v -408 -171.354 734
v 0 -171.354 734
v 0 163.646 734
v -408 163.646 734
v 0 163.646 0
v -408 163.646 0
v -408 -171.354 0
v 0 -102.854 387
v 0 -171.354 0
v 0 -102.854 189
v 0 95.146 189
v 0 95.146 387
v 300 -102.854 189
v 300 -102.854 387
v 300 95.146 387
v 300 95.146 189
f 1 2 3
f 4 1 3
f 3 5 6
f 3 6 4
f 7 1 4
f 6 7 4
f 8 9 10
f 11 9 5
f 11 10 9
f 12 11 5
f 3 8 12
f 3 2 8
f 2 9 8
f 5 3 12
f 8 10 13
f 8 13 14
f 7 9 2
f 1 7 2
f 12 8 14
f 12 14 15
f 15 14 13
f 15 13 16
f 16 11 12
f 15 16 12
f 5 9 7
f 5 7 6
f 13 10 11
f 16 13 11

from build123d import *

# Parameters (mm, degrees)
F0_W     = 335
F0_H     = 734
F1_DEPTH = 408
F2_W     = 198
F2_H     = 198
F3_DEPTH = 300


with BuildPart() as f1:
    # F0 (on Right) → F1 (new body)
    with BuildSketch(Plane.YZ):
        with Locations((-3.853569, 367)):
            Rectangle(F0_W, F0_H)
    extrude(amount=-F1_DEPTH)

    # F2 (on face) → F3 (join)
    with BuildSketch(Plane.YZ):
        with Locations((-3.853569, 288)):
            Rectangle(F2_W, F2_H)
    extrude(amount=F3_DEPTH)


solid = f1.part
